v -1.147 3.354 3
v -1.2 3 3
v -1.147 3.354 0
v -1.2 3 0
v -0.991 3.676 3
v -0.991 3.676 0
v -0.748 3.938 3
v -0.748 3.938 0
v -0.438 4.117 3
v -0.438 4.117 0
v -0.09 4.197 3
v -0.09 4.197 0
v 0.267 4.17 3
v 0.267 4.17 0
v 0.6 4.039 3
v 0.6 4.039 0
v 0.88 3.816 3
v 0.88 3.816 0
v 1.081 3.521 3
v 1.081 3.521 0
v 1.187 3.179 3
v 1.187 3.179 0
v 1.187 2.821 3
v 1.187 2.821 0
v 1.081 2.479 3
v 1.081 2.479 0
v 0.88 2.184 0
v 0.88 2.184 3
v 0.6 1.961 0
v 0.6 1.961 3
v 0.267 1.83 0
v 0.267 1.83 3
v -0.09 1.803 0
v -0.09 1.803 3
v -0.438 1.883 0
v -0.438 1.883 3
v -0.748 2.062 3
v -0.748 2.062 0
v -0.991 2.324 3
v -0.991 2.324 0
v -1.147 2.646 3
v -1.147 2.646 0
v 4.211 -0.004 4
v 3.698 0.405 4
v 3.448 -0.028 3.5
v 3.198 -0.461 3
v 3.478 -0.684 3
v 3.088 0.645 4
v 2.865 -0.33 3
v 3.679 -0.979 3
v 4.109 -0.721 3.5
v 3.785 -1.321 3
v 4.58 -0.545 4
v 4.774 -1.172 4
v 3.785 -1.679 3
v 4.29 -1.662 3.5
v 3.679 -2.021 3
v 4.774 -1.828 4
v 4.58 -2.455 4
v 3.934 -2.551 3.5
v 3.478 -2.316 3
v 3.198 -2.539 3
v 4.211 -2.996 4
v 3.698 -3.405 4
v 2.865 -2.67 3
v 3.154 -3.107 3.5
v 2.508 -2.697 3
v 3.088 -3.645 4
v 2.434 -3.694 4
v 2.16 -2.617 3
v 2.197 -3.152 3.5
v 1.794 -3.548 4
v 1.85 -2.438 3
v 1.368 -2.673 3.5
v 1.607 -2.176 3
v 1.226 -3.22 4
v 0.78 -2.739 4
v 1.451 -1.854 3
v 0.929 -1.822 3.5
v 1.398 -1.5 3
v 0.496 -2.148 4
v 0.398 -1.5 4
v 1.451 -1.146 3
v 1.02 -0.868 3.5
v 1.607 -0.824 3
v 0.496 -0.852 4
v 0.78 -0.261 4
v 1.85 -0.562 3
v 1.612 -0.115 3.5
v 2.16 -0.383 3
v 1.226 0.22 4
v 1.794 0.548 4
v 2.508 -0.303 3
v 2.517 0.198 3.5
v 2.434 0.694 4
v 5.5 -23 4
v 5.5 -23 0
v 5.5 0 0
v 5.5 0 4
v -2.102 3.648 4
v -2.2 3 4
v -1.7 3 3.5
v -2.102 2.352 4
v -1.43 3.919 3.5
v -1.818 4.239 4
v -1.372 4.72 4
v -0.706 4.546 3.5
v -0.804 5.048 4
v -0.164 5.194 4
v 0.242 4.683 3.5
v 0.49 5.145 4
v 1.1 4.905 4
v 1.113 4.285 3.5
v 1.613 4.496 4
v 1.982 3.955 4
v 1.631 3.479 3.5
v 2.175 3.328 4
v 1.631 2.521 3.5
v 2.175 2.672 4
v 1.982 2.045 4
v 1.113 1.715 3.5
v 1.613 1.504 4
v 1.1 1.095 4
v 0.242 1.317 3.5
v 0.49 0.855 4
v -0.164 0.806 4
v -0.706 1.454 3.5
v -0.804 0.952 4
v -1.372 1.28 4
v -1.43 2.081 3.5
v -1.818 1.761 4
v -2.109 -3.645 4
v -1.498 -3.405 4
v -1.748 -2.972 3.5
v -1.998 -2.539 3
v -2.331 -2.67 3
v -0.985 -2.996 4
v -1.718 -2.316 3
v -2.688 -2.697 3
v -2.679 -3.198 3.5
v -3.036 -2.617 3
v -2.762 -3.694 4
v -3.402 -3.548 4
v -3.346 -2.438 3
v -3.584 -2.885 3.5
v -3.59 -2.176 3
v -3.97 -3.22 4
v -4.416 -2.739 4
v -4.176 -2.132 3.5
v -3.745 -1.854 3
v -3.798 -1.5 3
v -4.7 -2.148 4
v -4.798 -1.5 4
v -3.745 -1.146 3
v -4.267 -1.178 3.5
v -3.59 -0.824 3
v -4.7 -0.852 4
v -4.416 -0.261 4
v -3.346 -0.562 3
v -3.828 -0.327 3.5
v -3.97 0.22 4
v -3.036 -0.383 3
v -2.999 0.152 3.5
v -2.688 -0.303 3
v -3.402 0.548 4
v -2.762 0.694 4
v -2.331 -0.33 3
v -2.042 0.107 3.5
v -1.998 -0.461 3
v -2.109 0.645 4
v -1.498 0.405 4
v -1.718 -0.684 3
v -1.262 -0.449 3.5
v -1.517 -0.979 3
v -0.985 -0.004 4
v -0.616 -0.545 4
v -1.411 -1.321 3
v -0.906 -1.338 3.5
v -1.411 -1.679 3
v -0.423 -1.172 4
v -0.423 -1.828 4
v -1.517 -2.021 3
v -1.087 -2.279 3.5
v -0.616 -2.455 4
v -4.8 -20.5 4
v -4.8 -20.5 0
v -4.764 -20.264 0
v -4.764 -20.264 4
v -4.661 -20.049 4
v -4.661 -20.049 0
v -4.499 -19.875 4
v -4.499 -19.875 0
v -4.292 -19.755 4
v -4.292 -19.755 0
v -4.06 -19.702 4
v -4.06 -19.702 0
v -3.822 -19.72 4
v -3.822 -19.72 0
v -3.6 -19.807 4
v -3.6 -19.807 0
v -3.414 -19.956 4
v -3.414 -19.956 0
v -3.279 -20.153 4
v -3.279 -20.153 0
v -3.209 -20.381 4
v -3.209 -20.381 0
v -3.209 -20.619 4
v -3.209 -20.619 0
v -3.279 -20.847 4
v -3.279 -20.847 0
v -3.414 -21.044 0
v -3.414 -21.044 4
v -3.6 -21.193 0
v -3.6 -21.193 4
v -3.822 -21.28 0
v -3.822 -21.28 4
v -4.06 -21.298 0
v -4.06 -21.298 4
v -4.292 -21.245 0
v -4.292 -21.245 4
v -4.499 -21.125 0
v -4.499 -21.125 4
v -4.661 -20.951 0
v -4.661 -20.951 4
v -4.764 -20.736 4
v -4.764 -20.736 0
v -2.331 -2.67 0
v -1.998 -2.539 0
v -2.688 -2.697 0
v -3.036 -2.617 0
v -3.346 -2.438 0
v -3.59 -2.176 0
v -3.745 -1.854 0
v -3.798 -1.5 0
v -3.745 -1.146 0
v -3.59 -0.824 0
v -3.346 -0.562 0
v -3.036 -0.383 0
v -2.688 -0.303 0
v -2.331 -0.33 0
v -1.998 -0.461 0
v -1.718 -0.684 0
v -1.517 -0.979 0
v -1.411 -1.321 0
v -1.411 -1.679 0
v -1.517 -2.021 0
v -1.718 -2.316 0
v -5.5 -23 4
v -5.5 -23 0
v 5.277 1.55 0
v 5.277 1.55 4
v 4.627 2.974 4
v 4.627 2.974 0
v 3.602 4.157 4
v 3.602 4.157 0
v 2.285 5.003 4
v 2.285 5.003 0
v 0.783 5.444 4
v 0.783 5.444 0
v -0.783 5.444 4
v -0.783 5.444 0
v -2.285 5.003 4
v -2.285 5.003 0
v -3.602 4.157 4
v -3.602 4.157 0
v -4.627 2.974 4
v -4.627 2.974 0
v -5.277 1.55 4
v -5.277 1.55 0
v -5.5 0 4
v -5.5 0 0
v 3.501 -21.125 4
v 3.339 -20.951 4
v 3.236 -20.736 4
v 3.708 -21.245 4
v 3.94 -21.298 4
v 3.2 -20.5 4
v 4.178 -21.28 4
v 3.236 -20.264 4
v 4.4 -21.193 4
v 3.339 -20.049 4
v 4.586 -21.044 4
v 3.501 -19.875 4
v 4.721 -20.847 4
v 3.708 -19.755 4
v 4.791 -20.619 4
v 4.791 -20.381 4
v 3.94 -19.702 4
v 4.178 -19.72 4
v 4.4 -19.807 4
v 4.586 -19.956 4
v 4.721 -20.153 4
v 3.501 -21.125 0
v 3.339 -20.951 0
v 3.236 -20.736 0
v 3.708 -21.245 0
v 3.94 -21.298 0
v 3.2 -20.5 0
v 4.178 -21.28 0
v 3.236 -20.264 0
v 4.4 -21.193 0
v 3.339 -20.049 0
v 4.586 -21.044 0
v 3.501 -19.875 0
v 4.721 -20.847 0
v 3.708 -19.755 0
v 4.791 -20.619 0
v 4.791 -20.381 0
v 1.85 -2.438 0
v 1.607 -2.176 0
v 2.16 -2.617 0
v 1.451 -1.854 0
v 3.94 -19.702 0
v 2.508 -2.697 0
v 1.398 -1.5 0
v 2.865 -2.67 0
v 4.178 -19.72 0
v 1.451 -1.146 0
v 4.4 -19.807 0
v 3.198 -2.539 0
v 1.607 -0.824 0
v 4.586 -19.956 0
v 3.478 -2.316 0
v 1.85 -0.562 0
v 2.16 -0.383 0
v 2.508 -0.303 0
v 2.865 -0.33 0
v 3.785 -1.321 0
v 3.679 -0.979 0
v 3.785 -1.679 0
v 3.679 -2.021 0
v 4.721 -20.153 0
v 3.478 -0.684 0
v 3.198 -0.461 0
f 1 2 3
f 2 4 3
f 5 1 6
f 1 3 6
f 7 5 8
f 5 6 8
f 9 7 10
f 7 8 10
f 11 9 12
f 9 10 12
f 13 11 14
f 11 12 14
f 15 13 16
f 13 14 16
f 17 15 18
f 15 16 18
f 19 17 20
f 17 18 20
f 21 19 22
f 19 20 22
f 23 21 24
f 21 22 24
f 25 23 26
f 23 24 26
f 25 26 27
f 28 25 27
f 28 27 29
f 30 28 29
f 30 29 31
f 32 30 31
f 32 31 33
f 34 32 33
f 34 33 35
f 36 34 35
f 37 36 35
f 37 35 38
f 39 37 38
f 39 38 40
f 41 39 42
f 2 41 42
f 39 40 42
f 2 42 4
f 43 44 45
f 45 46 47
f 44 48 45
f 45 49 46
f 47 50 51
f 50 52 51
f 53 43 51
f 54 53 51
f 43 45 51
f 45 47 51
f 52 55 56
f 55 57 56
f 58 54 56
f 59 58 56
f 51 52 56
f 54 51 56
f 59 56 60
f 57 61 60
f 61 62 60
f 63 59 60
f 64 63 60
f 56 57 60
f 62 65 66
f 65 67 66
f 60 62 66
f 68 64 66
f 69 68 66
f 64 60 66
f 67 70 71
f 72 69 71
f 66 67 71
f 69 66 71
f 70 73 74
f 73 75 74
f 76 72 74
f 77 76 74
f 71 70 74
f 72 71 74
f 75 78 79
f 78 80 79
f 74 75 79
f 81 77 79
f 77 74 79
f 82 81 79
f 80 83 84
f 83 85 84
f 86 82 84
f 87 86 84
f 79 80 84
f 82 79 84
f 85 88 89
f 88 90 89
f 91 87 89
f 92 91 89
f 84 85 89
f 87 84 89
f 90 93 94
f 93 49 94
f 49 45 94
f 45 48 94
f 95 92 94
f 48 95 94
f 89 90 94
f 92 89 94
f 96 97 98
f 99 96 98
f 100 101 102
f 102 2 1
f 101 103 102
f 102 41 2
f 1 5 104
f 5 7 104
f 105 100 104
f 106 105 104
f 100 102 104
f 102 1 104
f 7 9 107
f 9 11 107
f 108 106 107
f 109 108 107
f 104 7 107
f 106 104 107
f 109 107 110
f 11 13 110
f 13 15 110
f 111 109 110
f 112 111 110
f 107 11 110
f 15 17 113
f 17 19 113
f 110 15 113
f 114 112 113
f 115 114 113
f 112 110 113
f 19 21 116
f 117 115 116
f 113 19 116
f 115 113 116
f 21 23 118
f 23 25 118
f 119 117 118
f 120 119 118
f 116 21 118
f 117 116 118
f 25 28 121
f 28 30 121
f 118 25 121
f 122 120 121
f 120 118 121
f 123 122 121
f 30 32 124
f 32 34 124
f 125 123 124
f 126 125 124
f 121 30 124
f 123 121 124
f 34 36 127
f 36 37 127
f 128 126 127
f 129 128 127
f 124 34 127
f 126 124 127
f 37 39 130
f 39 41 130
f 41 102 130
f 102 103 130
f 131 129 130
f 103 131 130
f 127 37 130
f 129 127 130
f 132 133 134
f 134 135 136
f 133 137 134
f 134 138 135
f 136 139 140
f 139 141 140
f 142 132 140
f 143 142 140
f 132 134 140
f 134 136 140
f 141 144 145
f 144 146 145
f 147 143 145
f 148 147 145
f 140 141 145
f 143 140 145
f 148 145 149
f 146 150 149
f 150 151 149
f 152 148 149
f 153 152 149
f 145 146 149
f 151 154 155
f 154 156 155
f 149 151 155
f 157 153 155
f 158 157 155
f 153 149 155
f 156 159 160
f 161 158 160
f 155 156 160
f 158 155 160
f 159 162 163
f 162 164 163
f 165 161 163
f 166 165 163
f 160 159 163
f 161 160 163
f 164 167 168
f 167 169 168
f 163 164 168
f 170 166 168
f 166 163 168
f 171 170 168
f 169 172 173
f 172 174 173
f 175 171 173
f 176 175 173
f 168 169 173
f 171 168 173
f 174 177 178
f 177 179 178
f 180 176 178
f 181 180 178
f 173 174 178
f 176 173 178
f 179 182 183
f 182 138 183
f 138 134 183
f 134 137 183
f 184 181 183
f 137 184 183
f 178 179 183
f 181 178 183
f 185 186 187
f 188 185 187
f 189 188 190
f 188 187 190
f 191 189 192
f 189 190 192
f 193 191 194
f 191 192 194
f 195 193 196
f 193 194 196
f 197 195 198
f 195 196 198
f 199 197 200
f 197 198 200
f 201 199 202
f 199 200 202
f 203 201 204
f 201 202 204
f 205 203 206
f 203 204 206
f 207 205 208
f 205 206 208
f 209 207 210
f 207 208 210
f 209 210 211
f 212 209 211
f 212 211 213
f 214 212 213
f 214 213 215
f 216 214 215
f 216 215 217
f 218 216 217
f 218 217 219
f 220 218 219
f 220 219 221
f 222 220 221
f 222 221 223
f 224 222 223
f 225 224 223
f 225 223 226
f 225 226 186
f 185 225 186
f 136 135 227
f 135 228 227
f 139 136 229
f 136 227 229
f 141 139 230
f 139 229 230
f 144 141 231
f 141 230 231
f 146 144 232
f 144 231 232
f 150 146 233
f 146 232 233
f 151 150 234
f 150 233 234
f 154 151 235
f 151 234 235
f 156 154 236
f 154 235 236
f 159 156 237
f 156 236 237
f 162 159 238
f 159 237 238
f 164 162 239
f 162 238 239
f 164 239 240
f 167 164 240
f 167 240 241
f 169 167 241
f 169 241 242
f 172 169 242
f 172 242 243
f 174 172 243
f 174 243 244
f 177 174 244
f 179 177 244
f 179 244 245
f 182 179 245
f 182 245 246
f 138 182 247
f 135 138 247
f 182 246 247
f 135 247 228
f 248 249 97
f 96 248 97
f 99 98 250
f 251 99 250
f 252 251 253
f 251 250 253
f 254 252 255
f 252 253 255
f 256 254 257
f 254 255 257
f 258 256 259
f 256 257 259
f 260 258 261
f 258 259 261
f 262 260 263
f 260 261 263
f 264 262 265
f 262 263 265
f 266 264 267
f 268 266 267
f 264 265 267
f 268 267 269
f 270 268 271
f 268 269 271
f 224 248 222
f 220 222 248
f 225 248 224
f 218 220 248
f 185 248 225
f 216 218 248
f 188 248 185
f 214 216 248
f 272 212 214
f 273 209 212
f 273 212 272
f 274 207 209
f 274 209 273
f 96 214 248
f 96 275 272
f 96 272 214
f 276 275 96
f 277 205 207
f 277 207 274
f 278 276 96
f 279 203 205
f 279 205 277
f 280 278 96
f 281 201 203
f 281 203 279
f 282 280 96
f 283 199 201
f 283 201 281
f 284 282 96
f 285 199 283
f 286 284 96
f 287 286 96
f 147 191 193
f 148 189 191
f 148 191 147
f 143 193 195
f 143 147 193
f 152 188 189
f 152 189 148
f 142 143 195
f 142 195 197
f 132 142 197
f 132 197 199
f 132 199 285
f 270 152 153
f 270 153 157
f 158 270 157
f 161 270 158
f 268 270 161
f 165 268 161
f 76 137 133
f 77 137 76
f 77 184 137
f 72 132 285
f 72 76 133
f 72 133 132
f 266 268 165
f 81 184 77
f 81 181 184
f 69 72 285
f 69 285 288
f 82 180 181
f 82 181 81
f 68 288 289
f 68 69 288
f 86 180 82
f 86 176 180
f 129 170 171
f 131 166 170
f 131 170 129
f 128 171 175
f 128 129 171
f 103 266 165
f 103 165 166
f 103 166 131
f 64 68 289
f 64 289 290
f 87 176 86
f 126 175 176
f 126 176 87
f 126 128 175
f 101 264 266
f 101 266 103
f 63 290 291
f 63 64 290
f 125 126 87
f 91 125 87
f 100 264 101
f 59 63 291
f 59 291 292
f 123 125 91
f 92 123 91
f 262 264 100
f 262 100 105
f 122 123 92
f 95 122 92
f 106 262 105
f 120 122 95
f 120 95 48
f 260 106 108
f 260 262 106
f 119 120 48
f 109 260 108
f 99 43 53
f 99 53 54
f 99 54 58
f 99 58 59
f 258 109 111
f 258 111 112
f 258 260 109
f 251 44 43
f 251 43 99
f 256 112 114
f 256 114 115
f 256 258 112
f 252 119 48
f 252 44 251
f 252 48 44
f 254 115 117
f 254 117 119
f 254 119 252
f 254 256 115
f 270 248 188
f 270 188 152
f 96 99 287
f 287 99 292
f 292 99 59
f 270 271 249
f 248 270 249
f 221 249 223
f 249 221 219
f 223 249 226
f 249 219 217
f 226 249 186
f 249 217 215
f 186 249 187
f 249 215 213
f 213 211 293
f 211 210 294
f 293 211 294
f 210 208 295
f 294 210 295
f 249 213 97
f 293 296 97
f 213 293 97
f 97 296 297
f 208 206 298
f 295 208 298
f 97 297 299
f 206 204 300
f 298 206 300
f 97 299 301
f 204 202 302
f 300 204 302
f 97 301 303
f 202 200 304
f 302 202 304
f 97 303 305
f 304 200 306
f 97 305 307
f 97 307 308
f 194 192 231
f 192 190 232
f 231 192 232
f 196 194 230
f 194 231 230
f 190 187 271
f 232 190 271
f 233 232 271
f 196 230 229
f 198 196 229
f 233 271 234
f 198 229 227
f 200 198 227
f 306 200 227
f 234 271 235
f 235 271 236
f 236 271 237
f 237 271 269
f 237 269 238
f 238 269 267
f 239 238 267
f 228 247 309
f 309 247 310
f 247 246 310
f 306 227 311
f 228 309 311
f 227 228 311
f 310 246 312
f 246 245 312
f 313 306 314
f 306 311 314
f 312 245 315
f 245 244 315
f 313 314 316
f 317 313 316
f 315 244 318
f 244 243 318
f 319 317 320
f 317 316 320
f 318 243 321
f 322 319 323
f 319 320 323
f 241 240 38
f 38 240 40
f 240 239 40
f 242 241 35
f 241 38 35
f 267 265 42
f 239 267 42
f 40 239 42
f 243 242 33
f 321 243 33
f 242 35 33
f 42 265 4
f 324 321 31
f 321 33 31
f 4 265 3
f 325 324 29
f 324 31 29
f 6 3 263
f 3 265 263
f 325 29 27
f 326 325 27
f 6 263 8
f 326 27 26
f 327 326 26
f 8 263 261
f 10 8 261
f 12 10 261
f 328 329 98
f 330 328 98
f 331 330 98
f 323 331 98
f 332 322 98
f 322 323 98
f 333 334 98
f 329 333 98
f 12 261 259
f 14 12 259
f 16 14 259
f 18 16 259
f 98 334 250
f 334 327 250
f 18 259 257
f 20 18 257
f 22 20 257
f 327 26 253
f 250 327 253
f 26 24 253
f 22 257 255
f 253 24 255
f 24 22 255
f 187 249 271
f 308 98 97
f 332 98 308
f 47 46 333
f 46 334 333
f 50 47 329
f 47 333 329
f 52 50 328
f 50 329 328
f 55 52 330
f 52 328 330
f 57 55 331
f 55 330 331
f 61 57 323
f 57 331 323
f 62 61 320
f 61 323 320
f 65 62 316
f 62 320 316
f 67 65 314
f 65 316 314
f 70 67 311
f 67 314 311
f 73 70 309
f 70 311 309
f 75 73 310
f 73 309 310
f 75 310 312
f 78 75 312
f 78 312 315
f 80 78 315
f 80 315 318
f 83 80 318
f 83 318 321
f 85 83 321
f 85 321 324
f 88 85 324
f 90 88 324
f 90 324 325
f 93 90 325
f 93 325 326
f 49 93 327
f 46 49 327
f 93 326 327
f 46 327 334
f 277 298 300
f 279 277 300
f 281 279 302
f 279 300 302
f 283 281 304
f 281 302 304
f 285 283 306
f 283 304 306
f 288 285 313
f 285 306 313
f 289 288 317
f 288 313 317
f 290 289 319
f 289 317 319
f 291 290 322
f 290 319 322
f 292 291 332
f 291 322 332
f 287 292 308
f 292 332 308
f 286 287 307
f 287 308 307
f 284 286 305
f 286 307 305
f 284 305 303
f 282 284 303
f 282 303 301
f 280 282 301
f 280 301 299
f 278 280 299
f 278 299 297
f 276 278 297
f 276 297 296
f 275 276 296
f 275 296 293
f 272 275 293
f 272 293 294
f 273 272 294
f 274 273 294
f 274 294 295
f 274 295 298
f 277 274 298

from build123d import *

# Parameters (mm, degrees)
RESSALTO_EXTRUS_O1_DEPTH                             = 4
FURO_ROSCADO_DE_M21_D                                = 1.6
ESCAREADO_PARA_PARAFUSO_COM_CABE_A_ESCAR_D           = 2.4
ESCAREADO_PARA_PARAFUSO_COM_CABE_A_ESCAR_CSINK_D     = 4.4
ESCAREADO_PARA_PARAFUSO_COM_CABE_A_ESCAR_CSINK_ANGLE = 90
PADR_OCIRCULAR1_COUNT                                = 3


with BuildPart() as part:
    # Esboço1 → Ressalto-extrusão1 (new body)
    with BuildSketch(Plane.XY):
        with BuildLine():
            Line((-5.5, 0), (-5.5, -23))
            Line((-5.5, -23), (5.5, -23))
            Line((5.5, -23), (5.5, 0))
            ThreePointArc((5.5, 0), (0, 5.5), (-5.5, 0))
        make_face()
    extrude(amount=RESSALTO_EXTRUS_O1_DEPTH)

    # Furo roscado de M21 (through all)
    with Locations(Plane(origin=(-4, -20.5, 4), x_dir=(1, 0, 0), z_dir=(0, 0, 1))):
        with Locations((0, 0), (8, 0)):
            Hole(FURO_ROSCADO_DE_M21_D / 2)

    # Escareado para parafuso com cabeça escareada chata de M21 (through all)
    with Locations(Plane(origin=(0, 3, 4), x_dir=(1, 0, 0), z_dir=(0, 0, 1))):
        with Locations((0, 0)):
            escareado_para_parafuso_com_cabe_a_escar = CounterSinkHole(ESCAREADO_PARA_PARAFUSO_COM_CABE_A_ESCAR_D / 2, ESCAREADO_PARA_PARAFUSO_COM_CABE_A_ESCAR_CSINK_D / 2, counter_sink_angle=ESCAREADO_PARA_PARAFUSO_COM_CABE_A_ESCAR_CSINK_ANGLE)

    # PadrãoCircular1: Escareado para parafuso com cabeça escareada chata de M21 ×3 about axis
    padr_ocircular1_axis = Axis((0, 0, 0), (0, 0, 1))
    for i in range(1, PADR_OCIRCULAR1_COUNT):
        add(escareado_para_parafuso_com_cabe_a_escar.rotate(padr_ocircular1_axis, i * 360 / PADR_OCIRCULAR1_COUNT), mode=Mode.SUBTRACT)


solid = part.part
